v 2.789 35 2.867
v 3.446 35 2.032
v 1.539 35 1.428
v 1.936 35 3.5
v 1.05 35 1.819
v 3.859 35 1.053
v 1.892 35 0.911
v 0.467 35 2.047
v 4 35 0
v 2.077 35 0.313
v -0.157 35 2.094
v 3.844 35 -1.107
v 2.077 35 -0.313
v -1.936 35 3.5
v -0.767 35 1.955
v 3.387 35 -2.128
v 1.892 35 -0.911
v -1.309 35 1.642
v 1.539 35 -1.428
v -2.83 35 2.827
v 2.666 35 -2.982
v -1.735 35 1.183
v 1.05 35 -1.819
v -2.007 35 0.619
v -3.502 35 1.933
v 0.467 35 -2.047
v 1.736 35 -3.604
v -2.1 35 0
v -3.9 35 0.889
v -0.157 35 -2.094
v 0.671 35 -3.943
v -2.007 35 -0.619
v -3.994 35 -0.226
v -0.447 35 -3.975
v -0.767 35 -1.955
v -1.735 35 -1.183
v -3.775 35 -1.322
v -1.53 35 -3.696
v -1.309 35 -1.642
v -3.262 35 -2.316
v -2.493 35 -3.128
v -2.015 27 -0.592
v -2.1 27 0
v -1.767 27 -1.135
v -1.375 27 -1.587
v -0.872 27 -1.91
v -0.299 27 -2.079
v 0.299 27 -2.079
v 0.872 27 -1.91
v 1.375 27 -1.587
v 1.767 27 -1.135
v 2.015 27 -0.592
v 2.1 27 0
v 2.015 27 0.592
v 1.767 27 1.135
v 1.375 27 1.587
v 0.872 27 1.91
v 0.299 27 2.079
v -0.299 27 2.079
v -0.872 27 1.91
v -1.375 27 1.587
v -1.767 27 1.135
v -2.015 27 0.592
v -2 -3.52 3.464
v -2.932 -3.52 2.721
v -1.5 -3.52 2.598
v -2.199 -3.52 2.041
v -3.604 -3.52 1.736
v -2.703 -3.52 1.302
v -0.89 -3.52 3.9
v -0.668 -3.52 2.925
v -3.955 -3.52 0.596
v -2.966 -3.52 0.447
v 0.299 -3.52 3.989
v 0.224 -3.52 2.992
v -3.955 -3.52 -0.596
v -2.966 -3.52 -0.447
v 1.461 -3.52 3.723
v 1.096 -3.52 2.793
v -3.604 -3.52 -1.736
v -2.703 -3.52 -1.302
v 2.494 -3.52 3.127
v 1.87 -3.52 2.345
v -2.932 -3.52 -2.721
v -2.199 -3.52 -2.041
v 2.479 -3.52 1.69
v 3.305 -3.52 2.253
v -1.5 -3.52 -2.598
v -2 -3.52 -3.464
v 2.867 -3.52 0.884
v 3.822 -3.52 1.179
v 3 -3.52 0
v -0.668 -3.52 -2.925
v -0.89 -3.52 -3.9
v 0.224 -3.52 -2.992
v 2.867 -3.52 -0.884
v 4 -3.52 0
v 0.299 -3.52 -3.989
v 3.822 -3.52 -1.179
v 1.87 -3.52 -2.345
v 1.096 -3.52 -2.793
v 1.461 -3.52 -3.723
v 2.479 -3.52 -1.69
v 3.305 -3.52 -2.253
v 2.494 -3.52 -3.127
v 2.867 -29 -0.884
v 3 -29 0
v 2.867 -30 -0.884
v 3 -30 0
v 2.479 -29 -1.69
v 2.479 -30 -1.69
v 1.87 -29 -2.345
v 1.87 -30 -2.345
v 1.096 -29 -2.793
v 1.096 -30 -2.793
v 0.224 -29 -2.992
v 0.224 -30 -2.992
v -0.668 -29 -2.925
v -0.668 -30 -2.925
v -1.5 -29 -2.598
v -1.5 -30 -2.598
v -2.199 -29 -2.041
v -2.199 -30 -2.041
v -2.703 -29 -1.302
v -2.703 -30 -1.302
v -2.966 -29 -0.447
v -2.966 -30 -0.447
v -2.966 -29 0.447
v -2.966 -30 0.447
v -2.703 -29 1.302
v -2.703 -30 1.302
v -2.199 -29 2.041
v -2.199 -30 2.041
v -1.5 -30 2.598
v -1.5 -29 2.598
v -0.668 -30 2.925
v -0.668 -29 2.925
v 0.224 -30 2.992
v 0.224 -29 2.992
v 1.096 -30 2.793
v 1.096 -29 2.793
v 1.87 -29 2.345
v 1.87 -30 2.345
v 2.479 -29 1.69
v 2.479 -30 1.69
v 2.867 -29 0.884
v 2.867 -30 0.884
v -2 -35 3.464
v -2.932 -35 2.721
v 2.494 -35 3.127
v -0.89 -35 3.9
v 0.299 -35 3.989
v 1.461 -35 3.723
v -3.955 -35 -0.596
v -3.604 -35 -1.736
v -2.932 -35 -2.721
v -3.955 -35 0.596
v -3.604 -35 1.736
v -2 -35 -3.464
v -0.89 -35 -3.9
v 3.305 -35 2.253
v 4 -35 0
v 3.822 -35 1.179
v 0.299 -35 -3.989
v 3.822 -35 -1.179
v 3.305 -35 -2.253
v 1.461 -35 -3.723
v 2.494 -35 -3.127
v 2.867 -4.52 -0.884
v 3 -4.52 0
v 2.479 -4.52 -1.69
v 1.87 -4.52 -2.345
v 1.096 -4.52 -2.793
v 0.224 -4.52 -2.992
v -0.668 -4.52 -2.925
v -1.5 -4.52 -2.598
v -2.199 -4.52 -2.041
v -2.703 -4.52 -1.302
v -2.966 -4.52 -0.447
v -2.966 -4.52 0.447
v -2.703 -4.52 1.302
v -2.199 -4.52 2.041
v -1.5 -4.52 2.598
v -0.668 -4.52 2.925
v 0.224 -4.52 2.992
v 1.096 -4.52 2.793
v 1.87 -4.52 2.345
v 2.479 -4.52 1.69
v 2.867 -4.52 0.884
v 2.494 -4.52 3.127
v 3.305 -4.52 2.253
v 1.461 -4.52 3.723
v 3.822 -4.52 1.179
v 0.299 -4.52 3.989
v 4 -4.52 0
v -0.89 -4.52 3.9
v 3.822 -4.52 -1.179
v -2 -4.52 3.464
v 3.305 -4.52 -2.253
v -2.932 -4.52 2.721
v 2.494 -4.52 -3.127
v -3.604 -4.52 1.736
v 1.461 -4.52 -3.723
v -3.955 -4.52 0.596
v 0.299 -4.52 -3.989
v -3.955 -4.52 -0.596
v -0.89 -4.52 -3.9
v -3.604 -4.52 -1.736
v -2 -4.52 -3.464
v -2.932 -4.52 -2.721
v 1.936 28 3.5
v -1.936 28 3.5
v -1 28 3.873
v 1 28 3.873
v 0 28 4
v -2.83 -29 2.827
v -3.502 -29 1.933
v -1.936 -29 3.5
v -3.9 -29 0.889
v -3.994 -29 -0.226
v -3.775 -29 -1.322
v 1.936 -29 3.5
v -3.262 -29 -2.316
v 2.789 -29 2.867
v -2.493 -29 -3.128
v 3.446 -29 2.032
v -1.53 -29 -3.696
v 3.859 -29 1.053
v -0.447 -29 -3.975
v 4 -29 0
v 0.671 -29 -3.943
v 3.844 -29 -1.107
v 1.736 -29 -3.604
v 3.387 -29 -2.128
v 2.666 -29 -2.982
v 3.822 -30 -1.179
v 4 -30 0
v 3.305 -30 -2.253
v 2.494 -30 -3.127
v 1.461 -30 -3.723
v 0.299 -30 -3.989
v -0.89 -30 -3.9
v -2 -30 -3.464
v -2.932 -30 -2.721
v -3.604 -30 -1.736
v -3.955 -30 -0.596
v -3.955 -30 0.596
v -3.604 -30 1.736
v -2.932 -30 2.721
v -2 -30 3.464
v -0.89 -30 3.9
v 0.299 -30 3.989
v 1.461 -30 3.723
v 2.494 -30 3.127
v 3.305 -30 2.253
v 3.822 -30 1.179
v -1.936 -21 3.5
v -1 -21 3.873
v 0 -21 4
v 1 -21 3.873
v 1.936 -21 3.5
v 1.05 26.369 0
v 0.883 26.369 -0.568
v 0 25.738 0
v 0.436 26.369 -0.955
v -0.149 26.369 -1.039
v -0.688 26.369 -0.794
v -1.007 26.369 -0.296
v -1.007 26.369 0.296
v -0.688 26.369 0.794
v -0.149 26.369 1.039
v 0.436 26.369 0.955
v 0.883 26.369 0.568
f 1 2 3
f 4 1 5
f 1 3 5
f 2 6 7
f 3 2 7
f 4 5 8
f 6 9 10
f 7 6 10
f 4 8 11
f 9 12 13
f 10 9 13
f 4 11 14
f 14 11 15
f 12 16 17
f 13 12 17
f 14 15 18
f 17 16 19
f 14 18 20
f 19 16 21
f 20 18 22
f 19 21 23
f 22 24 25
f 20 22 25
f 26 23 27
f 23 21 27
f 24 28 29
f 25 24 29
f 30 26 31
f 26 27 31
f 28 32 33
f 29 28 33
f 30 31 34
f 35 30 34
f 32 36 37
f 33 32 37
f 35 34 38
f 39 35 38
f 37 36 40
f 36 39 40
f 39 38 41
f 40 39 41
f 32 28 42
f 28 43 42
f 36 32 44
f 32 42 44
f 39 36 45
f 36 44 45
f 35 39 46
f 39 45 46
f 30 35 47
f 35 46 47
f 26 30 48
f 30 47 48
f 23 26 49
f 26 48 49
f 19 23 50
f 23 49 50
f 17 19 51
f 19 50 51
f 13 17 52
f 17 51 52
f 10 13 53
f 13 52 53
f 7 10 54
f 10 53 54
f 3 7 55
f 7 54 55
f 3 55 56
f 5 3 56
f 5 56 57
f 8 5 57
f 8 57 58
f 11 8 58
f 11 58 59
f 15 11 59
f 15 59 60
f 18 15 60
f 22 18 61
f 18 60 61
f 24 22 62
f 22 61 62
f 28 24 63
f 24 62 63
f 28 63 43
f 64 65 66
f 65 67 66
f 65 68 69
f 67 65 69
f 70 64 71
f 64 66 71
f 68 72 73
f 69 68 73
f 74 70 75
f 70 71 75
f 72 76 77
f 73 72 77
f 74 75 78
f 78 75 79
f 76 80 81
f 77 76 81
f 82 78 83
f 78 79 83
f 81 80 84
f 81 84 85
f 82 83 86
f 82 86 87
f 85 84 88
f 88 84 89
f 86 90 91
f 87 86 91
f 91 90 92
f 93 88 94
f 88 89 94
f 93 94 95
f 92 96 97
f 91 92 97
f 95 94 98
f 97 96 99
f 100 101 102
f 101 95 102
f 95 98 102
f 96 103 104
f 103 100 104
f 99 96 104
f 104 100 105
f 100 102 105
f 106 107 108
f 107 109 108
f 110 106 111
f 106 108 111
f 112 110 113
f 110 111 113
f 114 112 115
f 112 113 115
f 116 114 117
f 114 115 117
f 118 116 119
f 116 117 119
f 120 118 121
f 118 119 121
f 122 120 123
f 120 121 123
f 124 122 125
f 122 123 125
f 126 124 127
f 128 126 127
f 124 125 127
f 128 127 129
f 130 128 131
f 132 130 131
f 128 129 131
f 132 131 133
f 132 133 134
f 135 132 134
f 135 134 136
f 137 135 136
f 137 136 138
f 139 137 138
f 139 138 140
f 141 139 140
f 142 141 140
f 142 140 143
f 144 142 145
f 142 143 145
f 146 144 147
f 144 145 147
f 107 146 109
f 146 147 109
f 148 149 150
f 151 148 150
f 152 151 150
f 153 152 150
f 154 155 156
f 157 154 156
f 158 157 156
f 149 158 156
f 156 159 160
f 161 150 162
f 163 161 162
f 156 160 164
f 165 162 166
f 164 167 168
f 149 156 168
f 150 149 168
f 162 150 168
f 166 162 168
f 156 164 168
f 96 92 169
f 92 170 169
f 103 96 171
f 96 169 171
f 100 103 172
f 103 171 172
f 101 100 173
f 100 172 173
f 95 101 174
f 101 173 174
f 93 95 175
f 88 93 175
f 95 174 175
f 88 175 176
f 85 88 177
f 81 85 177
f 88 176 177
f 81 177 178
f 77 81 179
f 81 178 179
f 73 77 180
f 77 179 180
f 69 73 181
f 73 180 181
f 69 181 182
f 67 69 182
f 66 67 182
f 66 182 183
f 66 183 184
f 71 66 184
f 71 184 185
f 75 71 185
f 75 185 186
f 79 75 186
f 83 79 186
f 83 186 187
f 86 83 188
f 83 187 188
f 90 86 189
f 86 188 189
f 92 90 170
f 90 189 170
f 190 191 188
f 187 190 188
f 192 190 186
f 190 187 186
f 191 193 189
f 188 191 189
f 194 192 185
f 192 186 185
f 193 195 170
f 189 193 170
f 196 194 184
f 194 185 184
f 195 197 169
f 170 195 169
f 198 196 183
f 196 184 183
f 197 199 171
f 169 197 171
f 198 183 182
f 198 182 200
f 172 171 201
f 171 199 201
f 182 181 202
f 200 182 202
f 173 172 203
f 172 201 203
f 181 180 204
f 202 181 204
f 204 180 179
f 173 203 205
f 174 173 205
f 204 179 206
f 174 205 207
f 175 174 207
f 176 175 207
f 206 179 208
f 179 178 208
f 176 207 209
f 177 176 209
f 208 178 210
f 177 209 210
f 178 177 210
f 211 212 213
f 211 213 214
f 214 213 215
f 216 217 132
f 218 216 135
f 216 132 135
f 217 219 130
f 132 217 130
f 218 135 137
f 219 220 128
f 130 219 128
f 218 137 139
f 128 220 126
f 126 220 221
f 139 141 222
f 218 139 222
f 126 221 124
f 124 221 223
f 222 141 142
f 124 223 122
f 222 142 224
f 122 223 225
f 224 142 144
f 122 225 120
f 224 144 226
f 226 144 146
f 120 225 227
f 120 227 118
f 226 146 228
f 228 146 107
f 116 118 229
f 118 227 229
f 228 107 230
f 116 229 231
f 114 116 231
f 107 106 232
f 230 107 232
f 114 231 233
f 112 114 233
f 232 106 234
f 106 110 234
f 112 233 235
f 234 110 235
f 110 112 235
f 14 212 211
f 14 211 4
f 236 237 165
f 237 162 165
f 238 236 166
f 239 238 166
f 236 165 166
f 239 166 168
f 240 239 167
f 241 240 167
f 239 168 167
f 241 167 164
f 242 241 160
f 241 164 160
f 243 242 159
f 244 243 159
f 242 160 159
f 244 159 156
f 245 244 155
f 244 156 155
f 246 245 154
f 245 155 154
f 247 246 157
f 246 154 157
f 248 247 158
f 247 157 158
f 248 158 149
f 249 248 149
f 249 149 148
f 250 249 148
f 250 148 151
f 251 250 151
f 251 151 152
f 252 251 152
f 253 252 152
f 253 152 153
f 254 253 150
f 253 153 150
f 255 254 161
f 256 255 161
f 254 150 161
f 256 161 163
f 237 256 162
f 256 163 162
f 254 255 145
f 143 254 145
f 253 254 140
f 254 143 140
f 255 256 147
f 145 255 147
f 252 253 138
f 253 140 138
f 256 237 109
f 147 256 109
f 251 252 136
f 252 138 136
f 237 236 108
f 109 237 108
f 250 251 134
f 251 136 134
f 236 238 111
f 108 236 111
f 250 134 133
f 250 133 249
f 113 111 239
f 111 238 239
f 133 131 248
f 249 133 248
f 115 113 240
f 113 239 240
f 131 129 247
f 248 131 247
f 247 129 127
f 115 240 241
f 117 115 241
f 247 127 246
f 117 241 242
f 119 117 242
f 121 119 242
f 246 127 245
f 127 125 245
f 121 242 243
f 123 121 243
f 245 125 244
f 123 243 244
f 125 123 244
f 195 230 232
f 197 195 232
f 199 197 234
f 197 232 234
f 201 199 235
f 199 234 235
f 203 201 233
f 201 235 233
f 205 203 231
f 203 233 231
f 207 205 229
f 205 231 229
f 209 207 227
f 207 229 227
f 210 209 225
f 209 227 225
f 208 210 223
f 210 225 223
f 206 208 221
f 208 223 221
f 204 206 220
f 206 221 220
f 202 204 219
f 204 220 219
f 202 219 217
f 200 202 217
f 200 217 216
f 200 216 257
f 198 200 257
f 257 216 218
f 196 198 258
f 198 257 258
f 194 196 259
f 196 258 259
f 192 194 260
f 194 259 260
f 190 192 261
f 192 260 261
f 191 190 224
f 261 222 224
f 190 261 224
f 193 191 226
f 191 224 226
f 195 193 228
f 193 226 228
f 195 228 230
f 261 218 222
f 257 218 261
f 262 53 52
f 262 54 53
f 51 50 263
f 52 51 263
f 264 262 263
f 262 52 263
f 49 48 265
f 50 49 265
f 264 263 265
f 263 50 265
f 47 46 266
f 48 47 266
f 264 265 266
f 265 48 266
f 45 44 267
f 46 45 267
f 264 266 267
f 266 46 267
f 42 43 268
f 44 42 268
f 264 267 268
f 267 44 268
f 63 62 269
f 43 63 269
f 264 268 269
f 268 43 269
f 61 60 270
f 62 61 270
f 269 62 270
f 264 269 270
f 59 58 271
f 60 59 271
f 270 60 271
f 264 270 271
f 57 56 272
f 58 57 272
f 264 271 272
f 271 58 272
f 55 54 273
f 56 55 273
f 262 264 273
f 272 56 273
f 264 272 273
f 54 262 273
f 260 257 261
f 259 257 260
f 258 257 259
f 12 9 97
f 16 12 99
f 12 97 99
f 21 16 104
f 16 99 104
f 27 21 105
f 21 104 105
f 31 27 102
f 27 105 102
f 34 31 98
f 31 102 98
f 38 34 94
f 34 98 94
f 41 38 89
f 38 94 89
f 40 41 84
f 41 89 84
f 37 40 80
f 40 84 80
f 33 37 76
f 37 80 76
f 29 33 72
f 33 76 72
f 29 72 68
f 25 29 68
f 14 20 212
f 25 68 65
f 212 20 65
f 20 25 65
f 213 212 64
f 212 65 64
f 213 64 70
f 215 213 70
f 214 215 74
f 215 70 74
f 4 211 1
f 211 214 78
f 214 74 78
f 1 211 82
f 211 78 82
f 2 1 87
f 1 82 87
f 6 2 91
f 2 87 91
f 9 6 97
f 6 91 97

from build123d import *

# Parameters (mm, degrees)
CORTAR_EXTRUIR1_DEPTH         = 36.454195802
CORTAR_EXTRUIR1_DEPTH_BACK    = 36.454195802
CROQUIS2_W                    = 0.5
CROQUIS2_H                    = 8
CROQUIS2_H_2                  = 7
TALADRO_ROSCADO_M5X0_81_D     = 4.2
TALADRO_ROSCADO_M5X0_81_DEPTH = 8
TALADRO_ROSCADO_M5X0_81_TIP   = 1.2618073


with BuildPart() as part:
    # Croquis1 → Revolución1 (revolve)
    with BuildSketch(Plane.XY):
        Polygon((0, 35), (4, 35), (4, -3.52), (3, -3.52), (3, -4.52), (4, -4.52), (4, -29), (3, -29), (3, -30), (4, -30), (4, -35), (0, -35), align=None)
    revolve(axis=Axis((0, -35, 0), (0, 1, 0)))

    # Croquis2 → Cortar-Extruir1 (cut, two sides: drawn at the far end of the back side and taken through both)
    with BuildSketch(Plane(origin=(0, 0, 0), x_dir=(0, 0, -1), z_dir=(1, 0, 0)).offset(-CORTAR_EXTRUIR1_DEPTH_BACK)):
        with Locations((-3.75, -25)):
            Rectangle(CROQUIS2_W, CROQUIS2_H)
        with Locations((-3.75, 31.5)):
            Rectangle(CROQUIS2_W, CROQUIS2_H_2)
    extrude(amount=CORTAR_EXTRUIR1_DEPTH + CORTAR_EXTRUIR1_DEPTH_BACK, mode=Mode.SUBTRACT)

    # Taladro roscado M5x0.81
    with Locations(Plane(origin=(0, 35, 0), x_dir=(1, 0, 0), z_dir=(0, 1, 0))):
        with Locations((0, 0)):
            Hole(TALADRO_ROSCADO_M5X0_81_D / 2, depth=TALADRO_ROSCADO_M5X0_81_DEPTH)
            with Locations((0, 0, -(TALADRO_ROSCADO_M5X0_81_DEPTH + TALADRO_ROSCADO_M5X0_81_TIP / 2))):  # 118° drill point
                Cone(0, TALADRO_ROSCADO_M5X0_81_D / 2, TALADRO_ROSCADO_M5X0_81_TIP, mode=Mode.SUBTRACT)


solid = part.part
